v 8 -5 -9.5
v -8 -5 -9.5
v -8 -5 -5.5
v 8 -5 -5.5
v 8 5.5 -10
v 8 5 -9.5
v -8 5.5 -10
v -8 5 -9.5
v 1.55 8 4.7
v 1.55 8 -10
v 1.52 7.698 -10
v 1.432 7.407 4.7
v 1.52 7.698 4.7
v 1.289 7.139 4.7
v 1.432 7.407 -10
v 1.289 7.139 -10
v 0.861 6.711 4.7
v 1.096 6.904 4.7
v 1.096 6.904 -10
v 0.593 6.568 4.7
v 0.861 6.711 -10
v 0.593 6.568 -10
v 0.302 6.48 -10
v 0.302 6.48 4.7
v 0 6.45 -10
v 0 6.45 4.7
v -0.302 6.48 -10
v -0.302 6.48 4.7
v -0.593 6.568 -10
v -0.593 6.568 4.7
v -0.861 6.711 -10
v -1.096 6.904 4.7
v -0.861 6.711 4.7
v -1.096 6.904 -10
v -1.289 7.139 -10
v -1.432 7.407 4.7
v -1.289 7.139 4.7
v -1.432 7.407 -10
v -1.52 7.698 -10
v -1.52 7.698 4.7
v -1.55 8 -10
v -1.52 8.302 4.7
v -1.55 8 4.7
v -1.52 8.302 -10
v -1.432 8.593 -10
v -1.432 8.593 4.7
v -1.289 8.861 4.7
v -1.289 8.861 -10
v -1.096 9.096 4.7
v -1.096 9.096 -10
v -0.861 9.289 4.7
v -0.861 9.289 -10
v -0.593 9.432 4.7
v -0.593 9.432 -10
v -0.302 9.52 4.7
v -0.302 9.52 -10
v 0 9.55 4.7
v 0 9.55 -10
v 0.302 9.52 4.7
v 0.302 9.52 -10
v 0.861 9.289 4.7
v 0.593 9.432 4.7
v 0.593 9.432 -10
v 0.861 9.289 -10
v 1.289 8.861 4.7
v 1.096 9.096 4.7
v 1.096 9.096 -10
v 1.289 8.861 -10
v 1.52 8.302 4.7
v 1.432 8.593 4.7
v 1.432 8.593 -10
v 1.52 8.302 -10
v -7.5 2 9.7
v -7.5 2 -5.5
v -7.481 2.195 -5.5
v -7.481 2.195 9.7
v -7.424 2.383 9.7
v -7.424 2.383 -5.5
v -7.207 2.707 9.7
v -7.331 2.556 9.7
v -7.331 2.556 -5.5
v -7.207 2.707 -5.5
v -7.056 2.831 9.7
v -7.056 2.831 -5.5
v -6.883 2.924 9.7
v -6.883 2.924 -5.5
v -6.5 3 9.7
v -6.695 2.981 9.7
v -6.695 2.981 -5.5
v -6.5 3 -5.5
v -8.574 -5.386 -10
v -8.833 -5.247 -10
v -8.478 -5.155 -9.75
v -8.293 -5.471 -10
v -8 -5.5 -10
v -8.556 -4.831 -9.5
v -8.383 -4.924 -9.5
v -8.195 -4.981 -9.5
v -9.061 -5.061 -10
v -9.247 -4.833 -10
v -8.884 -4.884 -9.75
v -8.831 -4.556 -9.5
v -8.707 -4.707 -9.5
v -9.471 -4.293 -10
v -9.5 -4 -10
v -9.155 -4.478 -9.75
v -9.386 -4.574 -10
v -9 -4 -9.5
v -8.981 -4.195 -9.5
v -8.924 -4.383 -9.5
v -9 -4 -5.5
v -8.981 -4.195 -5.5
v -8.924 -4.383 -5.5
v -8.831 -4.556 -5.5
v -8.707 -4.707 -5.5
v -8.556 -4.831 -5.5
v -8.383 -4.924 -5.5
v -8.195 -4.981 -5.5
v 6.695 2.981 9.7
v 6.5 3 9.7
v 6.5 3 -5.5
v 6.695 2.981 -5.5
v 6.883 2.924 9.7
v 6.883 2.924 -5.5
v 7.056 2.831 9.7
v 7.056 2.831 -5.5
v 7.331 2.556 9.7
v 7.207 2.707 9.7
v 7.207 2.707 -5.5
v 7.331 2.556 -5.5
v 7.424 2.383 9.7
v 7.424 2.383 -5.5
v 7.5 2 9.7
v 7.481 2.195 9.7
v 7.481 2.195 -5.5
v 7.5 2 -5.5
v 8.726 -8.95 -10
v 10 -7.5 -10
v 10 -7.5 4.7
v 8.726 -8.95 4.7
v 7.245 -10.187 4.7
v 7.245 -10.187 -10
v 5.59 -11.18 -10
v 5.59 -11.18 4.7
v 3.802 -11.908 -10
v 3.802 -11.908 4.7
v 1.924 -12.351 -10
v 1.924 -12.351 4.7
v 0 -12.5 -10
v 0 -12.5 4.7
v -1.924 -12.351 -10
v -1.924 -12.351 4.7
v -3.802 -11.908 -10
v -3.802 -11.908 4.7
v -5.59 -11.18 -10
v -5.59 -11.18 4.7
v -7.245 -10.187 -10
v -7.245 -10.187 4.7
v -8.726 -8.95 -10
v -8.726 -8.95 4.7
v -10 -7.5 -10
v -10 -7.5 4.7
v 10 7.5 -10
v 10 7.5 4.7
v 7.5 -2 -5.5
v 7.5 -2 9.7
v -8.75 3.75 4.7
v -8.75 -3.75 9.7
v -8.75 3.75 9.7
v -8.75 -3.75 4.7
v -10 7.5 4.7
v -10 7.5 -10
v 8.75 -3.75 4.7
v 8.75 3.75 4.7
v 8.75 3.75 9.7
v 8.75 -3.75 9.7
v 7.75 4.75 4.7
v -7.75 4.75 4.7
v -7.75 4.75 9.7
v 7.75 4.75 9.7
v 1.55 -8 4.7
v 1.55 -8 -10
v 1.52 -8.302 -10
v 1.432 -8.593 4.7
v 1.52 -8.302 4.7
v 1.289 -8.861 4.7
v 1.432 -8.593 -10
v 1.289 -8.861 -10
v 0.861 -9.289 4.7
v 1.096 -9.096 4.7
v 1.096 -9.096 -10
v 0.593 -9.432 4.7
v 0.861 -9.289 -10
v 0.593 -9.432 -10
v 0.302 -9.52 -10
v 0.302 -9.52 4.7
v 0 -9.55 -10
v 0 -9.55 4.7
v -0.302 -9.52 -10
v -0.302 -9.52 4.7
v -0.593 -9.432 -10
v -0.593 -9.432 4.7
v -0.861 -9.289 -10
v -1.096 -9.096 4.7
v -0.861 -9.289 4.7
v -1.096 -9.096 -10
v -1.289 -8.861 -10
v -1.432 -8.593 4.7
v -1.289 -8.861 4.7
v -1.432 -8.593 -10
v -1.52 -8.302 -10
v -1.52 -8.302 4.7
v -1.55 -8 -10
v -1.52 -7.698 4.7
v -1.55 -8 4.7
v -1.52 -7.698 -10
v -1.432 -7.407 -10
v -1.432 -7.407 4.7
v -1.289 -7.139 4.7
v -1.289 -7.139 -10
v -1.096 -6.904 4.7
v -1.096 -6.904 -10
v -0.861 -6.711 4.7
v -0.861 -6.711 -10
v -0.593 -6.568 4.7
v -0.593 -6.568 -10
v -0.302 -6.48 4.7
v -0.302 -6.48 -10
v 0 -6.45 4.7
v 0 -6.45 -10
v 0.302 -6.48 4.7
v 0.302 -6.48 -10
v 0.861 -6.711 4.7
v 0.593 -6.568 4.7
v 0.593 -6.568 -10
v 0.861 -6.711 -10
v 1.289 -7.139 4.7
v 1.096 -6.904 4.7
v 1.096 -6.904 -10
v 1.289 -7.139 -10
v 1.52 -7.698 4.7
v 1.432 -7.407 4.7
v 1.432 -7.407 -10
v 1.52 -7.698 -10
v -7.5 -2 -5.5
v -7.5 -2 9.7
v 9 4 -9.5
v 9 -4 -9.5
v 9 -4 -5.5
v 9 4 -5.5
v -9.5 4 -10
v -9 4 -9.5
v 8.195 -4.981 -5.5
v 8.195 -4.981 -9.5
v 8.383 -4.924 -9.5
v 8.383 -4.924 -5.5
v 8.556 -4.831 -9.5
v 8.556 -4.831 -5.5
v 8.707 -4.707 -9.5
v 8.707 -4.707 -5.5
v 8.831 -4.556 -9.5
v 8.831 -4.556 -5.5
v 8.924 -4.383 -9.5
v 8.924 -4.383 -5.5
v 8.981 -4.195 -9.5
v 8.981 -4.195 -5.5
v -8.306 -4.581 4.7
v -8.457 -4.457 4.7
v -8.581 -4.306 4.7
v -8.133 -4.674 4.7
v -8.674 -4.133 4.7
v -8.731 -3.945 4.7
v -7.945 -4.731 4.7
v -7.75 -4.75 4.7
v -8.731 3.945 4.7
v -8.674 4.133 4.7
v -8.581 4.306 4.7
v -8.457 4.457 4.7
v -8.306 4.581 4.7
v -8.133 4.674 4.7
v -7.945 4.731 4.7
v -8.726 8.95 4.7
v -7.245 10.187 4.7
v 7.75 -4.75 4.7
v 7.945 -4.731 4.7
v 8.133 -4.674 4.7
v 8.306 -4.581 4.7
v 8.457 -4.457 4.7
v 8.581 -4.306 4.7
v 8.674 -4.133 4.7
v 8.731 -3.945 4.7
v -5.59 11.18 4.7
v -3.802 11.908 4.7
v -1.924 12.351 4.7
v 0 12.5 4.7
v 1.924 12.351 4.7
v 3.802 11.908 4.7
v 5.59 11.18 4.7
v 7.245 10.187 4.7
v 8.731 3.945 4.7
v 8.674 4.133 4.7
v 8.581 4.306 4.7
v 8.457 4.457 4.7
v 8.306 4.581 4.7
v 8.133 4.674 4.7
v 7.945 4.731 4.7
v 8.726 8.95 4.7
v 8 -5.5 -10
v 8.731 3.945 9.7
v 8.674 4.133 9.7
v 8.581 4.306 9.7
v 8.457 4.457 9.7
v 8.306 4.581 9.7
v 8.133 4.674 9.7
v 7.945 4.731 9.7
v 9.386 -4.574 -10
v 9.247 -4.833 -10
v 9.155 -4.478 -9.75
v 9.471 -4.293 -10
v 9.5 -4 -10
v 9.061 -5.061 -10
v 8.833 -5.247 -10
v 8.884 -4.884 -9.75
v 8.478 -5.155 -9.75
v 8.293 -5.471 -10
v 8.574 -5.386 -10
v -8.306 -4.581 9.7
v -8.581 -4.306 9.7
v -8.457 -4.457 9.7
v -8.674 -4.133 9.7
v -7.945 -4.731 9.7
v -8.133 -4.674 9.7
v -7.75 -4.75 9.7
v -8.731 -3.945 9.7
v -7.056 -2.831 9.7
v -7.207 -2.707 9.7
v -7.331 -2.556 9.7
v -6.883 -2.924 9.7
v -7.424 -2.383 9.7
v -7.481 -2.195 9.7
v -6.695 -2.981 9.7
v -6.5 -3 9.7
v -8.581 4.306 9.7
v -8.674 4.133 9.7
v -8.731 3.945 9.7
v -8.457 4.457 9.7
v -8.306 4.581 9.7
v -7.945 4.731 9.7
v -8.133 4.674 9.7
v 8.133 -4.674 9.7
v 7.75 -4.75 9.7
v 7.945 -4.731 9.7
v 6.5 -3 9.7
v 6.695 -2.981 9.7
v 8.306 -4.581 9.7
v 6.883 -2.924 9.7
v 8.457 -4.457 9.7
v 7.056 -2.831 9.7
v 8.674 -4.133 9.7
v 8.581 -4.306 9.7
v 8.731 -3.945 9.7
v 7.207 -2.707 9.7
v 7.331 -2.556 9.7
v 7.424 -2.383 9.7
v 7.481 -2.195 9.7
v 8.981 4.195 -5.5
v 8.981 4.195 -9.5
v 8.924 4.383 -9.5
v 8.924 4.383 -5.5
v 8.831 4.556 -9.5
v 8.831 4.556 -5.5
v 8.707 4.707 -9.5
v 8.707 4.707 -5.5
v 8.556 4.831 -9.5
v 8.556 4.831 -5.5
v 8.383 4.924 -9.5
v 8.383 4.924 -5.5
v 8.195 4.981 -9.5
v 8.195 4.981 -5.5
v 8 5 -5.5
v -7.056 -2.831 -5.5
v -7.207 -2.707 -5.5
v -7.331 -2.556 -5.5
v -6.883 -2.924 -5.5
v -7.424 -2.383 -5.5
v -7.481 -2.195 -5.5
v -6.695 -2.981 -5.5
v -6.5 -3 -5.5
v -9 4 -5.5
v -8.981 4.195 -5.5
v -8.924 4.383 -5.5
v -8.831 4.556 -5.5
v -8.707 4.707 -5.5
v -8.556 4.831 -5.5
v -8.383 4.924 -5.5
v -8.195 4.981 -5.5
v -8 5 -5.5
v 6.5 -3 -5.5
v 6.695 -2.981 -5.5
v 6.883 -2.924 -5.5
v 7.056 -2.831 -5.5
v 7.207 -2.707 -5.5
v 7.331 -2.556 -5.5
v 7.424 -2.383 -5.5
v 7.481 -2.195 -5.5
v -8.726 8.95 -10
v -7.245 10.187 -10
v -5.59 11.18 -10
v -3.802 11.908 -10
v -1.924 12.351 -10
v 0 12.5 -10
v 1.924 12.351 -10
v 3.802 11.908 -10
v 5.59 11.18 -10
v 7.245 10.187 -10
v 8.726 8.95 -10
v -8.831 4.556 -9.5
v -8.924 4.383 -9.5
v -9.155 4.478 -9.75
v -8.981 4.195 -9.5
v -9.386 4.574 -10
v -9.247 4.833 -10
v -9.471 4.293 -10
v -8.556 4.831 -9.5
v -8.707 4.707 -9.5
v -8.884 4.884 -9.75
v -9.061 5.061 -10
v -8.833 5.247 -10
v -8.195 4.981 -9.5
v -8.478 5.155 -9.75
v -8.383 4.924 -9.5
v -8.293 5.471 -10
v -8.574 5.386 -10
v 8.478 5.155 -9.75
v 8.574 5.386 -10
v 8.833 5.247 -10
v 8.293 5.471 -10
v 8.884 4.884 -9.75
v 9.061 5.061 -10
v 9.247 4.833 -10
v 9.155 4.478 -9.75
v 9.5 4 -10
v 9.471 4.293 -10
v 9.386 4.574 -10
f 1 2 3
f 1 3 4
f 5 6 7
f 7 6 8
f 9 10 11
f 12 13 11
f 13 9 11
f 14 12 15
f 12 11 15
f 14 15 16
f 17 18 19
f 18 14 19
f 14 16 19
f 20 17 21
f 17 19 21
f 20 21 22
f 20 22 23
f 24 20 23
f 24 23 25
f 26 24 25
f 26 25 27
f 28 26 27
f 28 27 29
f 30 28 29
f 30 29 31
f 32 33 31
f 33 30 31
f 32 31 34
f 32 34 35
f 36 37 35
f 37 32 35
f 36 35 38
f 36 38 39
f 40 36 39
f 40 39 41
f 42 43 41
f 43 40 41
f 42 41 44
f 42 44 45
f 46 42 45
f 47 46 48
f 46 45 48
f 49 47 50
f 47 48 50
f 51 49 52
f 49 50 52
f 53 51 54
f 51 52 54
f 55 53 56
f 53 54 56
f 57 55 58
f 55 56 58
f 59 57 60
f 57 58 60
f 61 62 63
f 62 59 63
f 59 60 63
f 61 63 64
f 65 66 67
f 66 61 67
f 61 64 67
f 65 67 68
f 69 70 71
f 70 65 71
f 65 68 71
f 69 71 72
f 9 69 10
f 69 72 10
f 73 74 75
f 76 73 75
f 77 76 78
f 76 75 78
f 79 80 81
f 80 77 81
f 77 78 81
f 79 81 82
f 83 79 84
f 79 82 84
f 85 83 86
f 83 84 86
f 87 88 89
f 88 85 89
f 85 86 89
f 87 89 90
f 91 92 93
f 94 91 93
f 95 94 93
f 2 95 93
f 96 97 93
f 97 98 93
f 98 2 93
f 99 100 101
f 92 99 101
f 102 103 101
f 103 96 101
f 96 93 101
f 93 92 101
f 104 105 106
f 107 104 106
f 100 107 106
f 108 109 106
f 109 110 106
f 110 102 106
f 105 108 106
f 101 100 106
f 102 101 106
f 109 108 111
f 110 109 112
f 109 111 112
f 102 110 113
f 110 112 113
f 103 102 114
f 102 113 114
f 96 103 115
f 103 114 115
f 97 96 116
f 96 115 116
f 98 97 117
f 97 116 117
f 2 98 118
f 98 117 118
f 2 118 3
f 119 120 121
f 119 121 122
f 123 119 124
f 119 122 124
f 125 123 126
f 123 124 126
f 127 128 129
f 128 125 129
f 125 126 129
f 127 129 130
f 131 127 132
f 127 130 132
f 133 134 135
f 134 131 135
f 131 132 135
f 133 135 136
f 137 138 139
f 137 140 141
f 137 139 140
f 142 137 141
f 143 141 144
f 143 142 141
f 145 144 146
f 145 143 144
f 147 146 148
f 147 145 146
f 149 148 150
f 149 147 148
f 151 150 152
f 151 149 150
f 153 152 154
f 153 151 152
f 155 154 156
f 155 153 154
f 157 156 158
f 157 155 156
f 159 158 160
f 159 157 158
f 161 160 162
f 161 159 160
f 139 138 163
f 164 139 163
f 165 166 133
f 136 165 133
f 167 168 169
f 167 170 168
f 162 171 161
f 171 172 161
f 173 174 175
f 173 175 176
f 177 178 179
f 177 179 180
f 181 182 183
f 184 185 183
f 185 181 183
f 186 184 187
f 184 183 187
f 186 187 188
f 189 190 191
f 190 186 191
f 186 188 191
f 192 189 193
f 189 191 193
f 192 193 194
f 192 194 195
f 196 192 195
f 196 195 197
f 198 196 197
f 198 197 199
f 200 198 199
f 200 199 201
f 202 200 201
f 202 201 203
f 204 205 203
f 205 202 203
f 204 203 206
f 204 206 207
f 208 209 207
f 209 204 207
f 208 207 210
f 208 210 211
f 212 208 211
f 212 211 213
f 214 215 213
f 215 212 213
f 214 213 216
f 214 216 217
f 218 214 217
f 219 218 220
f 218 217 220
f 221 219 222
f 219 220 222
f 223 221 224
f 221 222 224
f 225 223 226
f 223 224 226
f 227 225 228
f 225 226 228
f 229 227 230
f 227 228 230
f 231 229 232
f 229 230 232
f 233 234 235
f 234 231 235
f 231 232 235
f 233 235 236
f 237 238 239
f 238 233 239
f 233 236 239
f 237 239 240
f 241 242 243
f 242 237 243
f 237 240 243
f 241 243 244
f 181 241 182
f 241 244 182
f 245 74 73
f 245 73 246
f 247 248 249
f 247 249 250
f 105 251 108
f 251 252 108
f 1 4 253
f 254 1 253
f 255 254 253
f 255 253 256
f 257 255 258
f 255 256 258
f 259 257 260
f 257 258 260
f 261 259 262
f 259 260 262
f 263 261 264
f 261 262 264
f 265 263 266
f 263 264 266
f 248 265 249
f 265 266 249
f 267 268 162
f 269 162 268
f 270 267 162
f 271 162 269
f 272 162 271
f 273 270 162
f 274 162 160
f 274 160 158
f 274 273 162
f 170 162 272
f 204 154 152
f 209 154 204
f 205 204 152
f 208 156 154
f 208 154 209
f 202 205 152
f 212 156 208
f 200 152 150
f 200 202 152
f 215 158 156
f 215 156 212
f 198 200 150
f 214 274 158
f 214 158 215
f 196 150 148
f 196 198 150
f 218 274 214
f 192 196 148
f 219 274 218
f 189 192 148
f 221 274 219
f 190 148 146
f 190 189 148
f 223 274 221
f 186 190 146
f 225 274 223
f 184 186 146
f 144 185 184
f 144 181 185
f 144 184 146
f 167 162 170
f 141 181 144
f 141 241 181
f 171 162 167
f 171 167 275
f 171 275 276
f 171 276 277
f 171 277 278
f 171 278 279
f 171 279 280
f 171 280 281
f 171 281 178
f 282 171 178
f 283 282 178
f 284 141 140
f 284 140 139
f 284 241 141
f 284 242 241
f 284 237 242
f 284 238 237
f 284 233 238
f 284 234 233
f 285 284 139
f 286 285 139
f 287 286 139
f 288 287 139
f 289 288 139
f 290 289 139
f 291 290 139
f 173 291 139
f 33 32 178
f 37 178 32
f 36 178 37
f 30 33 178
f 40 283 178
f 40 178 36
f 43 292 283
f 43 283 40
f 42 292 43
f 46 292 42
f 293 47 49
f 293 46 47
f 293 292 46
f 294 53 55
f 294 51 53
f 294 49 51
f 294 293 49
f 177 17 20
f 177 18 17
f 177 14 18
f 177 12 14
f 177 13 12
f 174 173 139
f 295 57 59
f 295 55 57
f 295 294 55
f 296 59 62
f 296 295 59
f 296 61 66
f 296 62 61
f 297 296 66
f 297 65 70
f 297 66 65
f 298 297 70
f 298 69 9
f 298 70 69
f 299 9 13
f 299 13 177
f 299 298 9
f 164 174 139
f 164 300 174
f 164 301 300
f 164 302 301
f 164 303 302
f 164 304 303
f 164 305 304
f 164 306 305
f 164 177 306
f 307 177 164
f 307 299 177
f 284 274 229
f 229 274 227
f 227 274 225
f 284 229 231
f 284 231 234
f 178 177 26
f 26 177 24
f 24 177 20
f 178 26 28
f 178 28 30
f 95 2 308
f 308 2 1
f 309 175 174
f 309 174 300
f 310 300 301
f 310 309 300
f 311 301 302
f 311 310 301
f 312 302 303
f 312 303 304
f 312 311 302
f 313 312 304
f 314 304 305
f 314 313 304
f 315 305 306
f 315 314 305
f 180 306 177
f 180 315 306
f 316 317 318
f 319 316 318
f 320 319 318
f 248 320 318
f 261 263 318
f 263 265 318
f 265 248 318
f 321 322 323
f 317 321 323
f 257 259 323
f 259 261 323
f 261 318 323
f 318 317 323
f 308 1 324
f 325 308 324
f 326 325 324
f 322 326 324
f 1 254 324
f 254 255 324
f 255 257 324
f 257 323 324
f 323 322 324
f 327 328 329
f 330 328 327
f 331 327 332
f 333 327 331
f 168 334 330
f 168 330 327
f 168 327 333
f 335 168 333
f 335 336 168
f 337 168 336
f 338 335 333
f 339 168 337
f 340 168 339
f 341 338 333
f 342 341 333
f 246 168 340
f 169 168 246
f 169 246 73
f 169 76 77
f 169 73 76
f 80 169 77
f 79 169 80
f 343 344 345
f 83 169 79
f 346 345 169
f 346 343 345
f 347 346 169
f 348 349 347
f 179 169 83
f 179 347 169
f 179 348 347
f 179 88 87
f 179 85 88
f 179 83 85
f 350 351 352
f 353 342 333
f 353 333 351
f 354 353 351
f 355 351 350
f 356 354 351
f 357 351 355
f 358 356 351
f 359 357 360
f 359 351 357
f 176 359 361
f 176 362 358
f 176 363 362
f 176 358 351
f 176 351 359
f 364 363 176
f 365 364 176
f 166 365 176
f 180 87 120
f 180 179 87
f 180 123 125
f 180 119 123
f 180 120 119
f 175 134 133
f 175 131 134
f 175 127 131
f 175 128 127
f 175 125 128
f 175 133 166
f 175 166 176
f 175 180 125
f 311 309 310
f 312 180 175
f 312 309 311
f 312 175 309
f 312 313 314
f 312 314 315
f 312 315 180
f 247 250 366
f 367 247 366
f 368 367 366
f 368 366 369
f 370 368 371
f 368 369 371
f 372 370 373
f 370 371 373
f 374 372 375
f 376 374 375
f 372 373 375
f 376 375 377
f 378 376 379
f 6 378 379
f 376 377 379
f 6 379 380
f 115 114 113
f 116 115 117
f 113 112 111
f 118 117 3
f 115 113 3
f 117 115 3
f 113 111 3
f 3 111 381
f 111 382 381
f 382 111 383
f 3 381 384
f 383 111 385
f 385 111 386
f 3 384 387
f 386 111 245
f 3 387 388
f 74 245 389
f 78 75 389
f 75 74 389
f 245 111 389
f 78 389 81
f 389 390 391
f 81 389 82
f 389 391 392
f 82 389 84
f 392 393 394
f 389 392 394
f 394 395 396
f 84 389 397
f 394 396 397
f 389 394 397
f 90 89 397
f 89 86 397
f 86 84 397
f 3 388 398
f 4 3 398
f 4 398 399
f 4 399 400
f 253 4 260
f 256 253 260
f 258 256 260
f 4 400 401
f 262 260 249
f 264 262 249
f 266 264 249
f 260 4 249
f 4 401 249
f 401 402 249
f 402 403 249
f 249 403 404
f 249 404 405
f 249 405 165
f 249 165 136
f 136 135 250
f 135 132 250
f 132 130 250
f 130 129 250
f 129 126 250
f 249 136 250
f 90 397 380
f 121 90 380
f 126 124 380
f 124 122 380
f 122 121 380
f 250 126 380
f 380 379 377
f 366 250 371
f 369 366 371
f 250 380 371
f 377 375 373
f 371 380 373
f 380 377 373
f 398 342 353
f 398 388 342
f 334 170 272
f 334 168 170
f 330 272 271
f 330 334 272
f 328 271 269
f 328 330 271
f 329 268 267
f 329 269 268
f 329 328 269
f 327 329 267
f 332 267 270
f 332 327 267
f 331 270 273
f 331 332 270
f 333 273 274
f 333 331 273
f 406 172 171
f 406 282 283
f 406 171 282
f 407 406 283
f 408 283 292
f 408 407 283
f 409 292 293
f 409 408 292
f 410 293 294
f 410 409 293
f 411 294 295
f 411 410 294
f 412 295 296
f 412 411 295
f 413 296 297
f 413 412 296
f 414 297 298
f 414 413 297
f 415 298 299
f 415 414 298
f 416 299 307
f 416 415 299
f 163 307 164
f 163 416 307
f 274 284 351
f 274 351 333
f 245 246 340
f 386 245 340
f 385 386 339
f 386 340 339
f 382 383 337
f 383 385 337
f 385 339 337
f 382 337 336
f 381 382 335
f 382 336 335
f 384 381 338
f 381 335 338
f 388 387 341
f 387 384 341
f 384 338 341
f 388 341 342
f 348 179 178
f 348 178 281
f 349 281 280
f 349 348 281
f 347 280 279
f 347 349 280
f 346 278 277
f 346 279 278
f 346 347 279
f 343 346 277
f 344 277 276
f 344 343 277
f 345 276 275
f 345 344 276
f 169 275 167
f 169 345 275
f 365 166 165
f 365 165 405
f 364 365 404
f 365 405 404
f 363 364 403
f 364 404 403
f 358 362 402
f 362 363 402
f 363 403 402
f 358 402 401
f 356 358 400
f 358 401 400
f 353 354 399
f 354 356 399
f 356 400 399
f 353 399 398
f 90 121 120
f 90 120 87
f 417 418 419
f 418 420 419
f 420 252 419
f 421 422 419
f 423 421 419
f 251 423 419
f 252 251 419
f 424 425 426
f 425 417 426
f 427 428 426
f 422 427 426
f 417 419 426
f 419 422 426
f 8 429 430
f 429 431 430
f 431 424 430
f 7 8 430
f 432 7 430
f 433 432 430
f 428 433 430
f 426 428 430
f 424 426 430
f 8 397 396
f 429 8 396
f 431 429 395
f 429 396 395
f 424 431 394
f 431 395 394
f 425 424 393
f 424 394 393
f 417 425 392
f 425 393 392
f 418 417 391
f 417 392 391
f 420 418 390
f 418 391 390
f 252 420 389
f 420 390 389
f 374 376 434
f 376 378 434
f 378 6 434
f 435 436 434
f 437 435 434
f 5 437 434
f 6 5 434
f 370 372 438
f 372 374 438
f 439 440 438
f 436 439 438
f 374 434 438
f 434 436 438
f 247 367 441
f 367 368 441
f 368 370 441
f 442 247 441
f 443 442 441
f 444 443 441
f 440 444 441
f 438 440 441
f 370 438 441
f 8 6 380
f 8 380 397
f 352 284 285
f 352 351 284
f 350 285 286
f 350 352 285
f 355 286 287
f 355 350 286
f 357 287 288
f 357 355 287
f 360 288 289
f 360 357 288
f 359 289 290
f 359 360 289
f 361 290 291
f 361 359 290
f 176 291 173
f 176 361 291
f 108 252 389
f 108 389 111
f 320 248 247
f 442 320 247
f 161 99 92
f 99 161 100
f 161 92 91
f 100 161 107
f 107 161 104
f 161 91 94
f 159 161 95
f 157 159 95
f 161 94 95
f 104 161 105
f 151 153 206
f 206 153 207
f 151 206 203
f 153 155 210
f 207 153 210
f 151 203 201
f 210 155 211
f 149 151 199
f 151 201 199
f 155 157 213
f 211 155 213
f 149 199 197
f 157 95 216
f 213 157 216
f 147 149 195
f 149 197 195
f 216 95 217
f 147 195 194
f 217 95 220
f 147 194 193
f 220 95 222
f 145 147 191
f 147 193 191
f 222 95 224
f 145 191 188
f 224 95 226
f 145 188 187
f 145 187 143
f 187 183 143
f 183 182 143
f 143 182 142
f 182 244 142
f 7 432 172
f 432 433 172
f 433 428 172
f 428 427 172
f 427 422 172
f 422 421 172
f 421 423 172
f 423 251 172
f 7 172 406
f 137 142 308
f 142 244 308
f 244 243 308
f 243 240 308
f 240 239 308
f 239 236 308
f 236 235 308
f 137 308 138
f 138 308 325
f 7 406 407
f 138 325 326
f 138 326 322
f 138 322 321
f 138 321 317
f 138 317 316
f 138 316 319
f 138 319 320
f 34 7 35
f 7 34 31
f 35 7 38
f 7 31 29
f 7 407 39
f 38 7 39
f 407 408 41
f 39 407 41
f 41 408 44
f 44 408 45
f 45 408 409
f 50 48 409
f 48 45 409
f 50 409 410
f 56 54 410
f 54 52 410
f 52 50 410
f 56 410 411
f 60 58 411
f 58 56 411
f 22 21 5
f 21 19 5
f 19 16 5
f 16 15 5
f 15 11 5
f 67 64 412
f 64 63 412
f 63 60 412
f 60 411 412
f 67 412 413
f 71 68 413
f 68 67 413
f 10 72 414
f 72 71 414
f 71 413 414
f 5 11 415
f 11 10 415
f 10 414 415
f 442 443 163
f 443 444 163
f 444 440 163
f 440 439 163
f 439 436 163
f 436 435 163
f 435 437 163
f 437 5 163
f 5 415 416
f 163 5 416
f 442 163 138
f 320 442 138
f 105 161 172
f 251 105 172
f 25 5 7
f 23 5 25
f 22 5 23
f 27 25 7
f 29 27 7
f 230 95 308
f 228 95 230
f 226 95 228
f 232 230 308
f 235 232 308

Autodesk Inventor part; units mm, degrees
ref_plane "YZ Plane" through (0, 0, 0) normal (1, 0, 0) x (0, 1, 0)
ref_plane "XZ Plane" through (0, 0, 0) normal (0, 1, 0) x (-1, 0, 0)
ref_plane "Work Plane1" through (0, 0, -10) normal (0, 0, 1) x (1, 0, 0)
sketch "Sketch1" plane through (0, 0, -10) normal (0, 0, 1) x (1, 0, 0)
  line L0 (0, -17.5) -> (0, 17.5) construction
  line L1 (-14, 0) -> (14, 0) construction
  line L2 (10, -7.5) -> (10, 7.5)
  arc A0 (10, 7.5) -> (-10, 7.5) centre (0, 0) ccw
  line L3 (-10, 7.5) -> (-10, -7.5)
  arc A1 (-10, -7.5) -> (10, -7.5) centre (0, 0) ccw
  circle A2 centre (0, -8) radius 1.55
  circle A3 centre (0, 8) radius 1.55
  line L4 (0, -8) -> (0, 8) construction
  line L5 (-9, -5) -> (9, -5)
  line L6 (9, -5) -> (9, 5)
  line L7 (9, 5) -> (-9, 5)
  line L8 (-9, 5) -> (-9, -5)
  line L9 (-7.5, -3) -> (7.5, -3)
  line L10 (7.5, -3) -> (7.5, 3)
  line L11 (7.5, 3) -> (-7.5, 3)
  line L12 (-7.5, 3) -> (-7.5, -3)
  line L13 (8.75, -4.75) -> (-8.75, -4.75)
  line L14 (-8.75, -4.75) -> (-8.75, 4.75)
  line L15 (-8.75, 4.75) -> (8.75, 4.75)
  line L16 (8.75, 4.75) -> (8.75, -4.75)
  point P0 (0, 0)
  point P1 (-10, 0)
  point P2 (10, 0)
  dimension "d1" = 15
  dimension "d2" = 12.5
  dimension "d3" = 20
  dimension "d4" = 3.1
  dimension "d5" = 16
  dimension "d6" = 18
  dimension "d7" = 10
  dimension "d8" = 15
  dimension "d9" = 6
  dimension "d18" = 0.25
extrude "Extrusion1" add sketch "Sketch1" along normal blind 14.7 contours A1 L3 A0 L2 | L8 L7 L6 L5 | L13 L14 L15 L16
extrude "Extrusion2" add sketch "Sketch1" along normal blind 5 from surface at 14.7 contours L13 L14 L15 L16
extrude "Extrusion3" cut sketch "Sketch1" along normal blind 4.5 contours L8 L7 L6 L5 | L13 L14 L15 L16
fillet "Fillet1" radius 1 12 edges at (-7.5, -3, 2.1) (-7.5, 3, 2.1) (7.5, 3, 2.1) (7.5, -3, 2.1) (9, -5, -7.75) (9, 5, -7.75) (-9, -5, -7.75) (-9, 5, -7.75) (-8.75, -4.75, 7.2) (-8.75, 4.75, 7.2) (8.75, -4.75, 7.2) (8.75, 4.75, 7.2)
chamfer "Chamfer1" distance 0.5 angle 45 8 edges at (9, 0, -10) (8.7071, 4.7071, -10) (0, 5, -10) (-8.7071, 4.7071, -10) (-9, 0, -10) (-8.7071, -4.7071, -10) (0, -5, -10) (8.7071, -4.7071, -10)
properties part number "Hip Adapter"
